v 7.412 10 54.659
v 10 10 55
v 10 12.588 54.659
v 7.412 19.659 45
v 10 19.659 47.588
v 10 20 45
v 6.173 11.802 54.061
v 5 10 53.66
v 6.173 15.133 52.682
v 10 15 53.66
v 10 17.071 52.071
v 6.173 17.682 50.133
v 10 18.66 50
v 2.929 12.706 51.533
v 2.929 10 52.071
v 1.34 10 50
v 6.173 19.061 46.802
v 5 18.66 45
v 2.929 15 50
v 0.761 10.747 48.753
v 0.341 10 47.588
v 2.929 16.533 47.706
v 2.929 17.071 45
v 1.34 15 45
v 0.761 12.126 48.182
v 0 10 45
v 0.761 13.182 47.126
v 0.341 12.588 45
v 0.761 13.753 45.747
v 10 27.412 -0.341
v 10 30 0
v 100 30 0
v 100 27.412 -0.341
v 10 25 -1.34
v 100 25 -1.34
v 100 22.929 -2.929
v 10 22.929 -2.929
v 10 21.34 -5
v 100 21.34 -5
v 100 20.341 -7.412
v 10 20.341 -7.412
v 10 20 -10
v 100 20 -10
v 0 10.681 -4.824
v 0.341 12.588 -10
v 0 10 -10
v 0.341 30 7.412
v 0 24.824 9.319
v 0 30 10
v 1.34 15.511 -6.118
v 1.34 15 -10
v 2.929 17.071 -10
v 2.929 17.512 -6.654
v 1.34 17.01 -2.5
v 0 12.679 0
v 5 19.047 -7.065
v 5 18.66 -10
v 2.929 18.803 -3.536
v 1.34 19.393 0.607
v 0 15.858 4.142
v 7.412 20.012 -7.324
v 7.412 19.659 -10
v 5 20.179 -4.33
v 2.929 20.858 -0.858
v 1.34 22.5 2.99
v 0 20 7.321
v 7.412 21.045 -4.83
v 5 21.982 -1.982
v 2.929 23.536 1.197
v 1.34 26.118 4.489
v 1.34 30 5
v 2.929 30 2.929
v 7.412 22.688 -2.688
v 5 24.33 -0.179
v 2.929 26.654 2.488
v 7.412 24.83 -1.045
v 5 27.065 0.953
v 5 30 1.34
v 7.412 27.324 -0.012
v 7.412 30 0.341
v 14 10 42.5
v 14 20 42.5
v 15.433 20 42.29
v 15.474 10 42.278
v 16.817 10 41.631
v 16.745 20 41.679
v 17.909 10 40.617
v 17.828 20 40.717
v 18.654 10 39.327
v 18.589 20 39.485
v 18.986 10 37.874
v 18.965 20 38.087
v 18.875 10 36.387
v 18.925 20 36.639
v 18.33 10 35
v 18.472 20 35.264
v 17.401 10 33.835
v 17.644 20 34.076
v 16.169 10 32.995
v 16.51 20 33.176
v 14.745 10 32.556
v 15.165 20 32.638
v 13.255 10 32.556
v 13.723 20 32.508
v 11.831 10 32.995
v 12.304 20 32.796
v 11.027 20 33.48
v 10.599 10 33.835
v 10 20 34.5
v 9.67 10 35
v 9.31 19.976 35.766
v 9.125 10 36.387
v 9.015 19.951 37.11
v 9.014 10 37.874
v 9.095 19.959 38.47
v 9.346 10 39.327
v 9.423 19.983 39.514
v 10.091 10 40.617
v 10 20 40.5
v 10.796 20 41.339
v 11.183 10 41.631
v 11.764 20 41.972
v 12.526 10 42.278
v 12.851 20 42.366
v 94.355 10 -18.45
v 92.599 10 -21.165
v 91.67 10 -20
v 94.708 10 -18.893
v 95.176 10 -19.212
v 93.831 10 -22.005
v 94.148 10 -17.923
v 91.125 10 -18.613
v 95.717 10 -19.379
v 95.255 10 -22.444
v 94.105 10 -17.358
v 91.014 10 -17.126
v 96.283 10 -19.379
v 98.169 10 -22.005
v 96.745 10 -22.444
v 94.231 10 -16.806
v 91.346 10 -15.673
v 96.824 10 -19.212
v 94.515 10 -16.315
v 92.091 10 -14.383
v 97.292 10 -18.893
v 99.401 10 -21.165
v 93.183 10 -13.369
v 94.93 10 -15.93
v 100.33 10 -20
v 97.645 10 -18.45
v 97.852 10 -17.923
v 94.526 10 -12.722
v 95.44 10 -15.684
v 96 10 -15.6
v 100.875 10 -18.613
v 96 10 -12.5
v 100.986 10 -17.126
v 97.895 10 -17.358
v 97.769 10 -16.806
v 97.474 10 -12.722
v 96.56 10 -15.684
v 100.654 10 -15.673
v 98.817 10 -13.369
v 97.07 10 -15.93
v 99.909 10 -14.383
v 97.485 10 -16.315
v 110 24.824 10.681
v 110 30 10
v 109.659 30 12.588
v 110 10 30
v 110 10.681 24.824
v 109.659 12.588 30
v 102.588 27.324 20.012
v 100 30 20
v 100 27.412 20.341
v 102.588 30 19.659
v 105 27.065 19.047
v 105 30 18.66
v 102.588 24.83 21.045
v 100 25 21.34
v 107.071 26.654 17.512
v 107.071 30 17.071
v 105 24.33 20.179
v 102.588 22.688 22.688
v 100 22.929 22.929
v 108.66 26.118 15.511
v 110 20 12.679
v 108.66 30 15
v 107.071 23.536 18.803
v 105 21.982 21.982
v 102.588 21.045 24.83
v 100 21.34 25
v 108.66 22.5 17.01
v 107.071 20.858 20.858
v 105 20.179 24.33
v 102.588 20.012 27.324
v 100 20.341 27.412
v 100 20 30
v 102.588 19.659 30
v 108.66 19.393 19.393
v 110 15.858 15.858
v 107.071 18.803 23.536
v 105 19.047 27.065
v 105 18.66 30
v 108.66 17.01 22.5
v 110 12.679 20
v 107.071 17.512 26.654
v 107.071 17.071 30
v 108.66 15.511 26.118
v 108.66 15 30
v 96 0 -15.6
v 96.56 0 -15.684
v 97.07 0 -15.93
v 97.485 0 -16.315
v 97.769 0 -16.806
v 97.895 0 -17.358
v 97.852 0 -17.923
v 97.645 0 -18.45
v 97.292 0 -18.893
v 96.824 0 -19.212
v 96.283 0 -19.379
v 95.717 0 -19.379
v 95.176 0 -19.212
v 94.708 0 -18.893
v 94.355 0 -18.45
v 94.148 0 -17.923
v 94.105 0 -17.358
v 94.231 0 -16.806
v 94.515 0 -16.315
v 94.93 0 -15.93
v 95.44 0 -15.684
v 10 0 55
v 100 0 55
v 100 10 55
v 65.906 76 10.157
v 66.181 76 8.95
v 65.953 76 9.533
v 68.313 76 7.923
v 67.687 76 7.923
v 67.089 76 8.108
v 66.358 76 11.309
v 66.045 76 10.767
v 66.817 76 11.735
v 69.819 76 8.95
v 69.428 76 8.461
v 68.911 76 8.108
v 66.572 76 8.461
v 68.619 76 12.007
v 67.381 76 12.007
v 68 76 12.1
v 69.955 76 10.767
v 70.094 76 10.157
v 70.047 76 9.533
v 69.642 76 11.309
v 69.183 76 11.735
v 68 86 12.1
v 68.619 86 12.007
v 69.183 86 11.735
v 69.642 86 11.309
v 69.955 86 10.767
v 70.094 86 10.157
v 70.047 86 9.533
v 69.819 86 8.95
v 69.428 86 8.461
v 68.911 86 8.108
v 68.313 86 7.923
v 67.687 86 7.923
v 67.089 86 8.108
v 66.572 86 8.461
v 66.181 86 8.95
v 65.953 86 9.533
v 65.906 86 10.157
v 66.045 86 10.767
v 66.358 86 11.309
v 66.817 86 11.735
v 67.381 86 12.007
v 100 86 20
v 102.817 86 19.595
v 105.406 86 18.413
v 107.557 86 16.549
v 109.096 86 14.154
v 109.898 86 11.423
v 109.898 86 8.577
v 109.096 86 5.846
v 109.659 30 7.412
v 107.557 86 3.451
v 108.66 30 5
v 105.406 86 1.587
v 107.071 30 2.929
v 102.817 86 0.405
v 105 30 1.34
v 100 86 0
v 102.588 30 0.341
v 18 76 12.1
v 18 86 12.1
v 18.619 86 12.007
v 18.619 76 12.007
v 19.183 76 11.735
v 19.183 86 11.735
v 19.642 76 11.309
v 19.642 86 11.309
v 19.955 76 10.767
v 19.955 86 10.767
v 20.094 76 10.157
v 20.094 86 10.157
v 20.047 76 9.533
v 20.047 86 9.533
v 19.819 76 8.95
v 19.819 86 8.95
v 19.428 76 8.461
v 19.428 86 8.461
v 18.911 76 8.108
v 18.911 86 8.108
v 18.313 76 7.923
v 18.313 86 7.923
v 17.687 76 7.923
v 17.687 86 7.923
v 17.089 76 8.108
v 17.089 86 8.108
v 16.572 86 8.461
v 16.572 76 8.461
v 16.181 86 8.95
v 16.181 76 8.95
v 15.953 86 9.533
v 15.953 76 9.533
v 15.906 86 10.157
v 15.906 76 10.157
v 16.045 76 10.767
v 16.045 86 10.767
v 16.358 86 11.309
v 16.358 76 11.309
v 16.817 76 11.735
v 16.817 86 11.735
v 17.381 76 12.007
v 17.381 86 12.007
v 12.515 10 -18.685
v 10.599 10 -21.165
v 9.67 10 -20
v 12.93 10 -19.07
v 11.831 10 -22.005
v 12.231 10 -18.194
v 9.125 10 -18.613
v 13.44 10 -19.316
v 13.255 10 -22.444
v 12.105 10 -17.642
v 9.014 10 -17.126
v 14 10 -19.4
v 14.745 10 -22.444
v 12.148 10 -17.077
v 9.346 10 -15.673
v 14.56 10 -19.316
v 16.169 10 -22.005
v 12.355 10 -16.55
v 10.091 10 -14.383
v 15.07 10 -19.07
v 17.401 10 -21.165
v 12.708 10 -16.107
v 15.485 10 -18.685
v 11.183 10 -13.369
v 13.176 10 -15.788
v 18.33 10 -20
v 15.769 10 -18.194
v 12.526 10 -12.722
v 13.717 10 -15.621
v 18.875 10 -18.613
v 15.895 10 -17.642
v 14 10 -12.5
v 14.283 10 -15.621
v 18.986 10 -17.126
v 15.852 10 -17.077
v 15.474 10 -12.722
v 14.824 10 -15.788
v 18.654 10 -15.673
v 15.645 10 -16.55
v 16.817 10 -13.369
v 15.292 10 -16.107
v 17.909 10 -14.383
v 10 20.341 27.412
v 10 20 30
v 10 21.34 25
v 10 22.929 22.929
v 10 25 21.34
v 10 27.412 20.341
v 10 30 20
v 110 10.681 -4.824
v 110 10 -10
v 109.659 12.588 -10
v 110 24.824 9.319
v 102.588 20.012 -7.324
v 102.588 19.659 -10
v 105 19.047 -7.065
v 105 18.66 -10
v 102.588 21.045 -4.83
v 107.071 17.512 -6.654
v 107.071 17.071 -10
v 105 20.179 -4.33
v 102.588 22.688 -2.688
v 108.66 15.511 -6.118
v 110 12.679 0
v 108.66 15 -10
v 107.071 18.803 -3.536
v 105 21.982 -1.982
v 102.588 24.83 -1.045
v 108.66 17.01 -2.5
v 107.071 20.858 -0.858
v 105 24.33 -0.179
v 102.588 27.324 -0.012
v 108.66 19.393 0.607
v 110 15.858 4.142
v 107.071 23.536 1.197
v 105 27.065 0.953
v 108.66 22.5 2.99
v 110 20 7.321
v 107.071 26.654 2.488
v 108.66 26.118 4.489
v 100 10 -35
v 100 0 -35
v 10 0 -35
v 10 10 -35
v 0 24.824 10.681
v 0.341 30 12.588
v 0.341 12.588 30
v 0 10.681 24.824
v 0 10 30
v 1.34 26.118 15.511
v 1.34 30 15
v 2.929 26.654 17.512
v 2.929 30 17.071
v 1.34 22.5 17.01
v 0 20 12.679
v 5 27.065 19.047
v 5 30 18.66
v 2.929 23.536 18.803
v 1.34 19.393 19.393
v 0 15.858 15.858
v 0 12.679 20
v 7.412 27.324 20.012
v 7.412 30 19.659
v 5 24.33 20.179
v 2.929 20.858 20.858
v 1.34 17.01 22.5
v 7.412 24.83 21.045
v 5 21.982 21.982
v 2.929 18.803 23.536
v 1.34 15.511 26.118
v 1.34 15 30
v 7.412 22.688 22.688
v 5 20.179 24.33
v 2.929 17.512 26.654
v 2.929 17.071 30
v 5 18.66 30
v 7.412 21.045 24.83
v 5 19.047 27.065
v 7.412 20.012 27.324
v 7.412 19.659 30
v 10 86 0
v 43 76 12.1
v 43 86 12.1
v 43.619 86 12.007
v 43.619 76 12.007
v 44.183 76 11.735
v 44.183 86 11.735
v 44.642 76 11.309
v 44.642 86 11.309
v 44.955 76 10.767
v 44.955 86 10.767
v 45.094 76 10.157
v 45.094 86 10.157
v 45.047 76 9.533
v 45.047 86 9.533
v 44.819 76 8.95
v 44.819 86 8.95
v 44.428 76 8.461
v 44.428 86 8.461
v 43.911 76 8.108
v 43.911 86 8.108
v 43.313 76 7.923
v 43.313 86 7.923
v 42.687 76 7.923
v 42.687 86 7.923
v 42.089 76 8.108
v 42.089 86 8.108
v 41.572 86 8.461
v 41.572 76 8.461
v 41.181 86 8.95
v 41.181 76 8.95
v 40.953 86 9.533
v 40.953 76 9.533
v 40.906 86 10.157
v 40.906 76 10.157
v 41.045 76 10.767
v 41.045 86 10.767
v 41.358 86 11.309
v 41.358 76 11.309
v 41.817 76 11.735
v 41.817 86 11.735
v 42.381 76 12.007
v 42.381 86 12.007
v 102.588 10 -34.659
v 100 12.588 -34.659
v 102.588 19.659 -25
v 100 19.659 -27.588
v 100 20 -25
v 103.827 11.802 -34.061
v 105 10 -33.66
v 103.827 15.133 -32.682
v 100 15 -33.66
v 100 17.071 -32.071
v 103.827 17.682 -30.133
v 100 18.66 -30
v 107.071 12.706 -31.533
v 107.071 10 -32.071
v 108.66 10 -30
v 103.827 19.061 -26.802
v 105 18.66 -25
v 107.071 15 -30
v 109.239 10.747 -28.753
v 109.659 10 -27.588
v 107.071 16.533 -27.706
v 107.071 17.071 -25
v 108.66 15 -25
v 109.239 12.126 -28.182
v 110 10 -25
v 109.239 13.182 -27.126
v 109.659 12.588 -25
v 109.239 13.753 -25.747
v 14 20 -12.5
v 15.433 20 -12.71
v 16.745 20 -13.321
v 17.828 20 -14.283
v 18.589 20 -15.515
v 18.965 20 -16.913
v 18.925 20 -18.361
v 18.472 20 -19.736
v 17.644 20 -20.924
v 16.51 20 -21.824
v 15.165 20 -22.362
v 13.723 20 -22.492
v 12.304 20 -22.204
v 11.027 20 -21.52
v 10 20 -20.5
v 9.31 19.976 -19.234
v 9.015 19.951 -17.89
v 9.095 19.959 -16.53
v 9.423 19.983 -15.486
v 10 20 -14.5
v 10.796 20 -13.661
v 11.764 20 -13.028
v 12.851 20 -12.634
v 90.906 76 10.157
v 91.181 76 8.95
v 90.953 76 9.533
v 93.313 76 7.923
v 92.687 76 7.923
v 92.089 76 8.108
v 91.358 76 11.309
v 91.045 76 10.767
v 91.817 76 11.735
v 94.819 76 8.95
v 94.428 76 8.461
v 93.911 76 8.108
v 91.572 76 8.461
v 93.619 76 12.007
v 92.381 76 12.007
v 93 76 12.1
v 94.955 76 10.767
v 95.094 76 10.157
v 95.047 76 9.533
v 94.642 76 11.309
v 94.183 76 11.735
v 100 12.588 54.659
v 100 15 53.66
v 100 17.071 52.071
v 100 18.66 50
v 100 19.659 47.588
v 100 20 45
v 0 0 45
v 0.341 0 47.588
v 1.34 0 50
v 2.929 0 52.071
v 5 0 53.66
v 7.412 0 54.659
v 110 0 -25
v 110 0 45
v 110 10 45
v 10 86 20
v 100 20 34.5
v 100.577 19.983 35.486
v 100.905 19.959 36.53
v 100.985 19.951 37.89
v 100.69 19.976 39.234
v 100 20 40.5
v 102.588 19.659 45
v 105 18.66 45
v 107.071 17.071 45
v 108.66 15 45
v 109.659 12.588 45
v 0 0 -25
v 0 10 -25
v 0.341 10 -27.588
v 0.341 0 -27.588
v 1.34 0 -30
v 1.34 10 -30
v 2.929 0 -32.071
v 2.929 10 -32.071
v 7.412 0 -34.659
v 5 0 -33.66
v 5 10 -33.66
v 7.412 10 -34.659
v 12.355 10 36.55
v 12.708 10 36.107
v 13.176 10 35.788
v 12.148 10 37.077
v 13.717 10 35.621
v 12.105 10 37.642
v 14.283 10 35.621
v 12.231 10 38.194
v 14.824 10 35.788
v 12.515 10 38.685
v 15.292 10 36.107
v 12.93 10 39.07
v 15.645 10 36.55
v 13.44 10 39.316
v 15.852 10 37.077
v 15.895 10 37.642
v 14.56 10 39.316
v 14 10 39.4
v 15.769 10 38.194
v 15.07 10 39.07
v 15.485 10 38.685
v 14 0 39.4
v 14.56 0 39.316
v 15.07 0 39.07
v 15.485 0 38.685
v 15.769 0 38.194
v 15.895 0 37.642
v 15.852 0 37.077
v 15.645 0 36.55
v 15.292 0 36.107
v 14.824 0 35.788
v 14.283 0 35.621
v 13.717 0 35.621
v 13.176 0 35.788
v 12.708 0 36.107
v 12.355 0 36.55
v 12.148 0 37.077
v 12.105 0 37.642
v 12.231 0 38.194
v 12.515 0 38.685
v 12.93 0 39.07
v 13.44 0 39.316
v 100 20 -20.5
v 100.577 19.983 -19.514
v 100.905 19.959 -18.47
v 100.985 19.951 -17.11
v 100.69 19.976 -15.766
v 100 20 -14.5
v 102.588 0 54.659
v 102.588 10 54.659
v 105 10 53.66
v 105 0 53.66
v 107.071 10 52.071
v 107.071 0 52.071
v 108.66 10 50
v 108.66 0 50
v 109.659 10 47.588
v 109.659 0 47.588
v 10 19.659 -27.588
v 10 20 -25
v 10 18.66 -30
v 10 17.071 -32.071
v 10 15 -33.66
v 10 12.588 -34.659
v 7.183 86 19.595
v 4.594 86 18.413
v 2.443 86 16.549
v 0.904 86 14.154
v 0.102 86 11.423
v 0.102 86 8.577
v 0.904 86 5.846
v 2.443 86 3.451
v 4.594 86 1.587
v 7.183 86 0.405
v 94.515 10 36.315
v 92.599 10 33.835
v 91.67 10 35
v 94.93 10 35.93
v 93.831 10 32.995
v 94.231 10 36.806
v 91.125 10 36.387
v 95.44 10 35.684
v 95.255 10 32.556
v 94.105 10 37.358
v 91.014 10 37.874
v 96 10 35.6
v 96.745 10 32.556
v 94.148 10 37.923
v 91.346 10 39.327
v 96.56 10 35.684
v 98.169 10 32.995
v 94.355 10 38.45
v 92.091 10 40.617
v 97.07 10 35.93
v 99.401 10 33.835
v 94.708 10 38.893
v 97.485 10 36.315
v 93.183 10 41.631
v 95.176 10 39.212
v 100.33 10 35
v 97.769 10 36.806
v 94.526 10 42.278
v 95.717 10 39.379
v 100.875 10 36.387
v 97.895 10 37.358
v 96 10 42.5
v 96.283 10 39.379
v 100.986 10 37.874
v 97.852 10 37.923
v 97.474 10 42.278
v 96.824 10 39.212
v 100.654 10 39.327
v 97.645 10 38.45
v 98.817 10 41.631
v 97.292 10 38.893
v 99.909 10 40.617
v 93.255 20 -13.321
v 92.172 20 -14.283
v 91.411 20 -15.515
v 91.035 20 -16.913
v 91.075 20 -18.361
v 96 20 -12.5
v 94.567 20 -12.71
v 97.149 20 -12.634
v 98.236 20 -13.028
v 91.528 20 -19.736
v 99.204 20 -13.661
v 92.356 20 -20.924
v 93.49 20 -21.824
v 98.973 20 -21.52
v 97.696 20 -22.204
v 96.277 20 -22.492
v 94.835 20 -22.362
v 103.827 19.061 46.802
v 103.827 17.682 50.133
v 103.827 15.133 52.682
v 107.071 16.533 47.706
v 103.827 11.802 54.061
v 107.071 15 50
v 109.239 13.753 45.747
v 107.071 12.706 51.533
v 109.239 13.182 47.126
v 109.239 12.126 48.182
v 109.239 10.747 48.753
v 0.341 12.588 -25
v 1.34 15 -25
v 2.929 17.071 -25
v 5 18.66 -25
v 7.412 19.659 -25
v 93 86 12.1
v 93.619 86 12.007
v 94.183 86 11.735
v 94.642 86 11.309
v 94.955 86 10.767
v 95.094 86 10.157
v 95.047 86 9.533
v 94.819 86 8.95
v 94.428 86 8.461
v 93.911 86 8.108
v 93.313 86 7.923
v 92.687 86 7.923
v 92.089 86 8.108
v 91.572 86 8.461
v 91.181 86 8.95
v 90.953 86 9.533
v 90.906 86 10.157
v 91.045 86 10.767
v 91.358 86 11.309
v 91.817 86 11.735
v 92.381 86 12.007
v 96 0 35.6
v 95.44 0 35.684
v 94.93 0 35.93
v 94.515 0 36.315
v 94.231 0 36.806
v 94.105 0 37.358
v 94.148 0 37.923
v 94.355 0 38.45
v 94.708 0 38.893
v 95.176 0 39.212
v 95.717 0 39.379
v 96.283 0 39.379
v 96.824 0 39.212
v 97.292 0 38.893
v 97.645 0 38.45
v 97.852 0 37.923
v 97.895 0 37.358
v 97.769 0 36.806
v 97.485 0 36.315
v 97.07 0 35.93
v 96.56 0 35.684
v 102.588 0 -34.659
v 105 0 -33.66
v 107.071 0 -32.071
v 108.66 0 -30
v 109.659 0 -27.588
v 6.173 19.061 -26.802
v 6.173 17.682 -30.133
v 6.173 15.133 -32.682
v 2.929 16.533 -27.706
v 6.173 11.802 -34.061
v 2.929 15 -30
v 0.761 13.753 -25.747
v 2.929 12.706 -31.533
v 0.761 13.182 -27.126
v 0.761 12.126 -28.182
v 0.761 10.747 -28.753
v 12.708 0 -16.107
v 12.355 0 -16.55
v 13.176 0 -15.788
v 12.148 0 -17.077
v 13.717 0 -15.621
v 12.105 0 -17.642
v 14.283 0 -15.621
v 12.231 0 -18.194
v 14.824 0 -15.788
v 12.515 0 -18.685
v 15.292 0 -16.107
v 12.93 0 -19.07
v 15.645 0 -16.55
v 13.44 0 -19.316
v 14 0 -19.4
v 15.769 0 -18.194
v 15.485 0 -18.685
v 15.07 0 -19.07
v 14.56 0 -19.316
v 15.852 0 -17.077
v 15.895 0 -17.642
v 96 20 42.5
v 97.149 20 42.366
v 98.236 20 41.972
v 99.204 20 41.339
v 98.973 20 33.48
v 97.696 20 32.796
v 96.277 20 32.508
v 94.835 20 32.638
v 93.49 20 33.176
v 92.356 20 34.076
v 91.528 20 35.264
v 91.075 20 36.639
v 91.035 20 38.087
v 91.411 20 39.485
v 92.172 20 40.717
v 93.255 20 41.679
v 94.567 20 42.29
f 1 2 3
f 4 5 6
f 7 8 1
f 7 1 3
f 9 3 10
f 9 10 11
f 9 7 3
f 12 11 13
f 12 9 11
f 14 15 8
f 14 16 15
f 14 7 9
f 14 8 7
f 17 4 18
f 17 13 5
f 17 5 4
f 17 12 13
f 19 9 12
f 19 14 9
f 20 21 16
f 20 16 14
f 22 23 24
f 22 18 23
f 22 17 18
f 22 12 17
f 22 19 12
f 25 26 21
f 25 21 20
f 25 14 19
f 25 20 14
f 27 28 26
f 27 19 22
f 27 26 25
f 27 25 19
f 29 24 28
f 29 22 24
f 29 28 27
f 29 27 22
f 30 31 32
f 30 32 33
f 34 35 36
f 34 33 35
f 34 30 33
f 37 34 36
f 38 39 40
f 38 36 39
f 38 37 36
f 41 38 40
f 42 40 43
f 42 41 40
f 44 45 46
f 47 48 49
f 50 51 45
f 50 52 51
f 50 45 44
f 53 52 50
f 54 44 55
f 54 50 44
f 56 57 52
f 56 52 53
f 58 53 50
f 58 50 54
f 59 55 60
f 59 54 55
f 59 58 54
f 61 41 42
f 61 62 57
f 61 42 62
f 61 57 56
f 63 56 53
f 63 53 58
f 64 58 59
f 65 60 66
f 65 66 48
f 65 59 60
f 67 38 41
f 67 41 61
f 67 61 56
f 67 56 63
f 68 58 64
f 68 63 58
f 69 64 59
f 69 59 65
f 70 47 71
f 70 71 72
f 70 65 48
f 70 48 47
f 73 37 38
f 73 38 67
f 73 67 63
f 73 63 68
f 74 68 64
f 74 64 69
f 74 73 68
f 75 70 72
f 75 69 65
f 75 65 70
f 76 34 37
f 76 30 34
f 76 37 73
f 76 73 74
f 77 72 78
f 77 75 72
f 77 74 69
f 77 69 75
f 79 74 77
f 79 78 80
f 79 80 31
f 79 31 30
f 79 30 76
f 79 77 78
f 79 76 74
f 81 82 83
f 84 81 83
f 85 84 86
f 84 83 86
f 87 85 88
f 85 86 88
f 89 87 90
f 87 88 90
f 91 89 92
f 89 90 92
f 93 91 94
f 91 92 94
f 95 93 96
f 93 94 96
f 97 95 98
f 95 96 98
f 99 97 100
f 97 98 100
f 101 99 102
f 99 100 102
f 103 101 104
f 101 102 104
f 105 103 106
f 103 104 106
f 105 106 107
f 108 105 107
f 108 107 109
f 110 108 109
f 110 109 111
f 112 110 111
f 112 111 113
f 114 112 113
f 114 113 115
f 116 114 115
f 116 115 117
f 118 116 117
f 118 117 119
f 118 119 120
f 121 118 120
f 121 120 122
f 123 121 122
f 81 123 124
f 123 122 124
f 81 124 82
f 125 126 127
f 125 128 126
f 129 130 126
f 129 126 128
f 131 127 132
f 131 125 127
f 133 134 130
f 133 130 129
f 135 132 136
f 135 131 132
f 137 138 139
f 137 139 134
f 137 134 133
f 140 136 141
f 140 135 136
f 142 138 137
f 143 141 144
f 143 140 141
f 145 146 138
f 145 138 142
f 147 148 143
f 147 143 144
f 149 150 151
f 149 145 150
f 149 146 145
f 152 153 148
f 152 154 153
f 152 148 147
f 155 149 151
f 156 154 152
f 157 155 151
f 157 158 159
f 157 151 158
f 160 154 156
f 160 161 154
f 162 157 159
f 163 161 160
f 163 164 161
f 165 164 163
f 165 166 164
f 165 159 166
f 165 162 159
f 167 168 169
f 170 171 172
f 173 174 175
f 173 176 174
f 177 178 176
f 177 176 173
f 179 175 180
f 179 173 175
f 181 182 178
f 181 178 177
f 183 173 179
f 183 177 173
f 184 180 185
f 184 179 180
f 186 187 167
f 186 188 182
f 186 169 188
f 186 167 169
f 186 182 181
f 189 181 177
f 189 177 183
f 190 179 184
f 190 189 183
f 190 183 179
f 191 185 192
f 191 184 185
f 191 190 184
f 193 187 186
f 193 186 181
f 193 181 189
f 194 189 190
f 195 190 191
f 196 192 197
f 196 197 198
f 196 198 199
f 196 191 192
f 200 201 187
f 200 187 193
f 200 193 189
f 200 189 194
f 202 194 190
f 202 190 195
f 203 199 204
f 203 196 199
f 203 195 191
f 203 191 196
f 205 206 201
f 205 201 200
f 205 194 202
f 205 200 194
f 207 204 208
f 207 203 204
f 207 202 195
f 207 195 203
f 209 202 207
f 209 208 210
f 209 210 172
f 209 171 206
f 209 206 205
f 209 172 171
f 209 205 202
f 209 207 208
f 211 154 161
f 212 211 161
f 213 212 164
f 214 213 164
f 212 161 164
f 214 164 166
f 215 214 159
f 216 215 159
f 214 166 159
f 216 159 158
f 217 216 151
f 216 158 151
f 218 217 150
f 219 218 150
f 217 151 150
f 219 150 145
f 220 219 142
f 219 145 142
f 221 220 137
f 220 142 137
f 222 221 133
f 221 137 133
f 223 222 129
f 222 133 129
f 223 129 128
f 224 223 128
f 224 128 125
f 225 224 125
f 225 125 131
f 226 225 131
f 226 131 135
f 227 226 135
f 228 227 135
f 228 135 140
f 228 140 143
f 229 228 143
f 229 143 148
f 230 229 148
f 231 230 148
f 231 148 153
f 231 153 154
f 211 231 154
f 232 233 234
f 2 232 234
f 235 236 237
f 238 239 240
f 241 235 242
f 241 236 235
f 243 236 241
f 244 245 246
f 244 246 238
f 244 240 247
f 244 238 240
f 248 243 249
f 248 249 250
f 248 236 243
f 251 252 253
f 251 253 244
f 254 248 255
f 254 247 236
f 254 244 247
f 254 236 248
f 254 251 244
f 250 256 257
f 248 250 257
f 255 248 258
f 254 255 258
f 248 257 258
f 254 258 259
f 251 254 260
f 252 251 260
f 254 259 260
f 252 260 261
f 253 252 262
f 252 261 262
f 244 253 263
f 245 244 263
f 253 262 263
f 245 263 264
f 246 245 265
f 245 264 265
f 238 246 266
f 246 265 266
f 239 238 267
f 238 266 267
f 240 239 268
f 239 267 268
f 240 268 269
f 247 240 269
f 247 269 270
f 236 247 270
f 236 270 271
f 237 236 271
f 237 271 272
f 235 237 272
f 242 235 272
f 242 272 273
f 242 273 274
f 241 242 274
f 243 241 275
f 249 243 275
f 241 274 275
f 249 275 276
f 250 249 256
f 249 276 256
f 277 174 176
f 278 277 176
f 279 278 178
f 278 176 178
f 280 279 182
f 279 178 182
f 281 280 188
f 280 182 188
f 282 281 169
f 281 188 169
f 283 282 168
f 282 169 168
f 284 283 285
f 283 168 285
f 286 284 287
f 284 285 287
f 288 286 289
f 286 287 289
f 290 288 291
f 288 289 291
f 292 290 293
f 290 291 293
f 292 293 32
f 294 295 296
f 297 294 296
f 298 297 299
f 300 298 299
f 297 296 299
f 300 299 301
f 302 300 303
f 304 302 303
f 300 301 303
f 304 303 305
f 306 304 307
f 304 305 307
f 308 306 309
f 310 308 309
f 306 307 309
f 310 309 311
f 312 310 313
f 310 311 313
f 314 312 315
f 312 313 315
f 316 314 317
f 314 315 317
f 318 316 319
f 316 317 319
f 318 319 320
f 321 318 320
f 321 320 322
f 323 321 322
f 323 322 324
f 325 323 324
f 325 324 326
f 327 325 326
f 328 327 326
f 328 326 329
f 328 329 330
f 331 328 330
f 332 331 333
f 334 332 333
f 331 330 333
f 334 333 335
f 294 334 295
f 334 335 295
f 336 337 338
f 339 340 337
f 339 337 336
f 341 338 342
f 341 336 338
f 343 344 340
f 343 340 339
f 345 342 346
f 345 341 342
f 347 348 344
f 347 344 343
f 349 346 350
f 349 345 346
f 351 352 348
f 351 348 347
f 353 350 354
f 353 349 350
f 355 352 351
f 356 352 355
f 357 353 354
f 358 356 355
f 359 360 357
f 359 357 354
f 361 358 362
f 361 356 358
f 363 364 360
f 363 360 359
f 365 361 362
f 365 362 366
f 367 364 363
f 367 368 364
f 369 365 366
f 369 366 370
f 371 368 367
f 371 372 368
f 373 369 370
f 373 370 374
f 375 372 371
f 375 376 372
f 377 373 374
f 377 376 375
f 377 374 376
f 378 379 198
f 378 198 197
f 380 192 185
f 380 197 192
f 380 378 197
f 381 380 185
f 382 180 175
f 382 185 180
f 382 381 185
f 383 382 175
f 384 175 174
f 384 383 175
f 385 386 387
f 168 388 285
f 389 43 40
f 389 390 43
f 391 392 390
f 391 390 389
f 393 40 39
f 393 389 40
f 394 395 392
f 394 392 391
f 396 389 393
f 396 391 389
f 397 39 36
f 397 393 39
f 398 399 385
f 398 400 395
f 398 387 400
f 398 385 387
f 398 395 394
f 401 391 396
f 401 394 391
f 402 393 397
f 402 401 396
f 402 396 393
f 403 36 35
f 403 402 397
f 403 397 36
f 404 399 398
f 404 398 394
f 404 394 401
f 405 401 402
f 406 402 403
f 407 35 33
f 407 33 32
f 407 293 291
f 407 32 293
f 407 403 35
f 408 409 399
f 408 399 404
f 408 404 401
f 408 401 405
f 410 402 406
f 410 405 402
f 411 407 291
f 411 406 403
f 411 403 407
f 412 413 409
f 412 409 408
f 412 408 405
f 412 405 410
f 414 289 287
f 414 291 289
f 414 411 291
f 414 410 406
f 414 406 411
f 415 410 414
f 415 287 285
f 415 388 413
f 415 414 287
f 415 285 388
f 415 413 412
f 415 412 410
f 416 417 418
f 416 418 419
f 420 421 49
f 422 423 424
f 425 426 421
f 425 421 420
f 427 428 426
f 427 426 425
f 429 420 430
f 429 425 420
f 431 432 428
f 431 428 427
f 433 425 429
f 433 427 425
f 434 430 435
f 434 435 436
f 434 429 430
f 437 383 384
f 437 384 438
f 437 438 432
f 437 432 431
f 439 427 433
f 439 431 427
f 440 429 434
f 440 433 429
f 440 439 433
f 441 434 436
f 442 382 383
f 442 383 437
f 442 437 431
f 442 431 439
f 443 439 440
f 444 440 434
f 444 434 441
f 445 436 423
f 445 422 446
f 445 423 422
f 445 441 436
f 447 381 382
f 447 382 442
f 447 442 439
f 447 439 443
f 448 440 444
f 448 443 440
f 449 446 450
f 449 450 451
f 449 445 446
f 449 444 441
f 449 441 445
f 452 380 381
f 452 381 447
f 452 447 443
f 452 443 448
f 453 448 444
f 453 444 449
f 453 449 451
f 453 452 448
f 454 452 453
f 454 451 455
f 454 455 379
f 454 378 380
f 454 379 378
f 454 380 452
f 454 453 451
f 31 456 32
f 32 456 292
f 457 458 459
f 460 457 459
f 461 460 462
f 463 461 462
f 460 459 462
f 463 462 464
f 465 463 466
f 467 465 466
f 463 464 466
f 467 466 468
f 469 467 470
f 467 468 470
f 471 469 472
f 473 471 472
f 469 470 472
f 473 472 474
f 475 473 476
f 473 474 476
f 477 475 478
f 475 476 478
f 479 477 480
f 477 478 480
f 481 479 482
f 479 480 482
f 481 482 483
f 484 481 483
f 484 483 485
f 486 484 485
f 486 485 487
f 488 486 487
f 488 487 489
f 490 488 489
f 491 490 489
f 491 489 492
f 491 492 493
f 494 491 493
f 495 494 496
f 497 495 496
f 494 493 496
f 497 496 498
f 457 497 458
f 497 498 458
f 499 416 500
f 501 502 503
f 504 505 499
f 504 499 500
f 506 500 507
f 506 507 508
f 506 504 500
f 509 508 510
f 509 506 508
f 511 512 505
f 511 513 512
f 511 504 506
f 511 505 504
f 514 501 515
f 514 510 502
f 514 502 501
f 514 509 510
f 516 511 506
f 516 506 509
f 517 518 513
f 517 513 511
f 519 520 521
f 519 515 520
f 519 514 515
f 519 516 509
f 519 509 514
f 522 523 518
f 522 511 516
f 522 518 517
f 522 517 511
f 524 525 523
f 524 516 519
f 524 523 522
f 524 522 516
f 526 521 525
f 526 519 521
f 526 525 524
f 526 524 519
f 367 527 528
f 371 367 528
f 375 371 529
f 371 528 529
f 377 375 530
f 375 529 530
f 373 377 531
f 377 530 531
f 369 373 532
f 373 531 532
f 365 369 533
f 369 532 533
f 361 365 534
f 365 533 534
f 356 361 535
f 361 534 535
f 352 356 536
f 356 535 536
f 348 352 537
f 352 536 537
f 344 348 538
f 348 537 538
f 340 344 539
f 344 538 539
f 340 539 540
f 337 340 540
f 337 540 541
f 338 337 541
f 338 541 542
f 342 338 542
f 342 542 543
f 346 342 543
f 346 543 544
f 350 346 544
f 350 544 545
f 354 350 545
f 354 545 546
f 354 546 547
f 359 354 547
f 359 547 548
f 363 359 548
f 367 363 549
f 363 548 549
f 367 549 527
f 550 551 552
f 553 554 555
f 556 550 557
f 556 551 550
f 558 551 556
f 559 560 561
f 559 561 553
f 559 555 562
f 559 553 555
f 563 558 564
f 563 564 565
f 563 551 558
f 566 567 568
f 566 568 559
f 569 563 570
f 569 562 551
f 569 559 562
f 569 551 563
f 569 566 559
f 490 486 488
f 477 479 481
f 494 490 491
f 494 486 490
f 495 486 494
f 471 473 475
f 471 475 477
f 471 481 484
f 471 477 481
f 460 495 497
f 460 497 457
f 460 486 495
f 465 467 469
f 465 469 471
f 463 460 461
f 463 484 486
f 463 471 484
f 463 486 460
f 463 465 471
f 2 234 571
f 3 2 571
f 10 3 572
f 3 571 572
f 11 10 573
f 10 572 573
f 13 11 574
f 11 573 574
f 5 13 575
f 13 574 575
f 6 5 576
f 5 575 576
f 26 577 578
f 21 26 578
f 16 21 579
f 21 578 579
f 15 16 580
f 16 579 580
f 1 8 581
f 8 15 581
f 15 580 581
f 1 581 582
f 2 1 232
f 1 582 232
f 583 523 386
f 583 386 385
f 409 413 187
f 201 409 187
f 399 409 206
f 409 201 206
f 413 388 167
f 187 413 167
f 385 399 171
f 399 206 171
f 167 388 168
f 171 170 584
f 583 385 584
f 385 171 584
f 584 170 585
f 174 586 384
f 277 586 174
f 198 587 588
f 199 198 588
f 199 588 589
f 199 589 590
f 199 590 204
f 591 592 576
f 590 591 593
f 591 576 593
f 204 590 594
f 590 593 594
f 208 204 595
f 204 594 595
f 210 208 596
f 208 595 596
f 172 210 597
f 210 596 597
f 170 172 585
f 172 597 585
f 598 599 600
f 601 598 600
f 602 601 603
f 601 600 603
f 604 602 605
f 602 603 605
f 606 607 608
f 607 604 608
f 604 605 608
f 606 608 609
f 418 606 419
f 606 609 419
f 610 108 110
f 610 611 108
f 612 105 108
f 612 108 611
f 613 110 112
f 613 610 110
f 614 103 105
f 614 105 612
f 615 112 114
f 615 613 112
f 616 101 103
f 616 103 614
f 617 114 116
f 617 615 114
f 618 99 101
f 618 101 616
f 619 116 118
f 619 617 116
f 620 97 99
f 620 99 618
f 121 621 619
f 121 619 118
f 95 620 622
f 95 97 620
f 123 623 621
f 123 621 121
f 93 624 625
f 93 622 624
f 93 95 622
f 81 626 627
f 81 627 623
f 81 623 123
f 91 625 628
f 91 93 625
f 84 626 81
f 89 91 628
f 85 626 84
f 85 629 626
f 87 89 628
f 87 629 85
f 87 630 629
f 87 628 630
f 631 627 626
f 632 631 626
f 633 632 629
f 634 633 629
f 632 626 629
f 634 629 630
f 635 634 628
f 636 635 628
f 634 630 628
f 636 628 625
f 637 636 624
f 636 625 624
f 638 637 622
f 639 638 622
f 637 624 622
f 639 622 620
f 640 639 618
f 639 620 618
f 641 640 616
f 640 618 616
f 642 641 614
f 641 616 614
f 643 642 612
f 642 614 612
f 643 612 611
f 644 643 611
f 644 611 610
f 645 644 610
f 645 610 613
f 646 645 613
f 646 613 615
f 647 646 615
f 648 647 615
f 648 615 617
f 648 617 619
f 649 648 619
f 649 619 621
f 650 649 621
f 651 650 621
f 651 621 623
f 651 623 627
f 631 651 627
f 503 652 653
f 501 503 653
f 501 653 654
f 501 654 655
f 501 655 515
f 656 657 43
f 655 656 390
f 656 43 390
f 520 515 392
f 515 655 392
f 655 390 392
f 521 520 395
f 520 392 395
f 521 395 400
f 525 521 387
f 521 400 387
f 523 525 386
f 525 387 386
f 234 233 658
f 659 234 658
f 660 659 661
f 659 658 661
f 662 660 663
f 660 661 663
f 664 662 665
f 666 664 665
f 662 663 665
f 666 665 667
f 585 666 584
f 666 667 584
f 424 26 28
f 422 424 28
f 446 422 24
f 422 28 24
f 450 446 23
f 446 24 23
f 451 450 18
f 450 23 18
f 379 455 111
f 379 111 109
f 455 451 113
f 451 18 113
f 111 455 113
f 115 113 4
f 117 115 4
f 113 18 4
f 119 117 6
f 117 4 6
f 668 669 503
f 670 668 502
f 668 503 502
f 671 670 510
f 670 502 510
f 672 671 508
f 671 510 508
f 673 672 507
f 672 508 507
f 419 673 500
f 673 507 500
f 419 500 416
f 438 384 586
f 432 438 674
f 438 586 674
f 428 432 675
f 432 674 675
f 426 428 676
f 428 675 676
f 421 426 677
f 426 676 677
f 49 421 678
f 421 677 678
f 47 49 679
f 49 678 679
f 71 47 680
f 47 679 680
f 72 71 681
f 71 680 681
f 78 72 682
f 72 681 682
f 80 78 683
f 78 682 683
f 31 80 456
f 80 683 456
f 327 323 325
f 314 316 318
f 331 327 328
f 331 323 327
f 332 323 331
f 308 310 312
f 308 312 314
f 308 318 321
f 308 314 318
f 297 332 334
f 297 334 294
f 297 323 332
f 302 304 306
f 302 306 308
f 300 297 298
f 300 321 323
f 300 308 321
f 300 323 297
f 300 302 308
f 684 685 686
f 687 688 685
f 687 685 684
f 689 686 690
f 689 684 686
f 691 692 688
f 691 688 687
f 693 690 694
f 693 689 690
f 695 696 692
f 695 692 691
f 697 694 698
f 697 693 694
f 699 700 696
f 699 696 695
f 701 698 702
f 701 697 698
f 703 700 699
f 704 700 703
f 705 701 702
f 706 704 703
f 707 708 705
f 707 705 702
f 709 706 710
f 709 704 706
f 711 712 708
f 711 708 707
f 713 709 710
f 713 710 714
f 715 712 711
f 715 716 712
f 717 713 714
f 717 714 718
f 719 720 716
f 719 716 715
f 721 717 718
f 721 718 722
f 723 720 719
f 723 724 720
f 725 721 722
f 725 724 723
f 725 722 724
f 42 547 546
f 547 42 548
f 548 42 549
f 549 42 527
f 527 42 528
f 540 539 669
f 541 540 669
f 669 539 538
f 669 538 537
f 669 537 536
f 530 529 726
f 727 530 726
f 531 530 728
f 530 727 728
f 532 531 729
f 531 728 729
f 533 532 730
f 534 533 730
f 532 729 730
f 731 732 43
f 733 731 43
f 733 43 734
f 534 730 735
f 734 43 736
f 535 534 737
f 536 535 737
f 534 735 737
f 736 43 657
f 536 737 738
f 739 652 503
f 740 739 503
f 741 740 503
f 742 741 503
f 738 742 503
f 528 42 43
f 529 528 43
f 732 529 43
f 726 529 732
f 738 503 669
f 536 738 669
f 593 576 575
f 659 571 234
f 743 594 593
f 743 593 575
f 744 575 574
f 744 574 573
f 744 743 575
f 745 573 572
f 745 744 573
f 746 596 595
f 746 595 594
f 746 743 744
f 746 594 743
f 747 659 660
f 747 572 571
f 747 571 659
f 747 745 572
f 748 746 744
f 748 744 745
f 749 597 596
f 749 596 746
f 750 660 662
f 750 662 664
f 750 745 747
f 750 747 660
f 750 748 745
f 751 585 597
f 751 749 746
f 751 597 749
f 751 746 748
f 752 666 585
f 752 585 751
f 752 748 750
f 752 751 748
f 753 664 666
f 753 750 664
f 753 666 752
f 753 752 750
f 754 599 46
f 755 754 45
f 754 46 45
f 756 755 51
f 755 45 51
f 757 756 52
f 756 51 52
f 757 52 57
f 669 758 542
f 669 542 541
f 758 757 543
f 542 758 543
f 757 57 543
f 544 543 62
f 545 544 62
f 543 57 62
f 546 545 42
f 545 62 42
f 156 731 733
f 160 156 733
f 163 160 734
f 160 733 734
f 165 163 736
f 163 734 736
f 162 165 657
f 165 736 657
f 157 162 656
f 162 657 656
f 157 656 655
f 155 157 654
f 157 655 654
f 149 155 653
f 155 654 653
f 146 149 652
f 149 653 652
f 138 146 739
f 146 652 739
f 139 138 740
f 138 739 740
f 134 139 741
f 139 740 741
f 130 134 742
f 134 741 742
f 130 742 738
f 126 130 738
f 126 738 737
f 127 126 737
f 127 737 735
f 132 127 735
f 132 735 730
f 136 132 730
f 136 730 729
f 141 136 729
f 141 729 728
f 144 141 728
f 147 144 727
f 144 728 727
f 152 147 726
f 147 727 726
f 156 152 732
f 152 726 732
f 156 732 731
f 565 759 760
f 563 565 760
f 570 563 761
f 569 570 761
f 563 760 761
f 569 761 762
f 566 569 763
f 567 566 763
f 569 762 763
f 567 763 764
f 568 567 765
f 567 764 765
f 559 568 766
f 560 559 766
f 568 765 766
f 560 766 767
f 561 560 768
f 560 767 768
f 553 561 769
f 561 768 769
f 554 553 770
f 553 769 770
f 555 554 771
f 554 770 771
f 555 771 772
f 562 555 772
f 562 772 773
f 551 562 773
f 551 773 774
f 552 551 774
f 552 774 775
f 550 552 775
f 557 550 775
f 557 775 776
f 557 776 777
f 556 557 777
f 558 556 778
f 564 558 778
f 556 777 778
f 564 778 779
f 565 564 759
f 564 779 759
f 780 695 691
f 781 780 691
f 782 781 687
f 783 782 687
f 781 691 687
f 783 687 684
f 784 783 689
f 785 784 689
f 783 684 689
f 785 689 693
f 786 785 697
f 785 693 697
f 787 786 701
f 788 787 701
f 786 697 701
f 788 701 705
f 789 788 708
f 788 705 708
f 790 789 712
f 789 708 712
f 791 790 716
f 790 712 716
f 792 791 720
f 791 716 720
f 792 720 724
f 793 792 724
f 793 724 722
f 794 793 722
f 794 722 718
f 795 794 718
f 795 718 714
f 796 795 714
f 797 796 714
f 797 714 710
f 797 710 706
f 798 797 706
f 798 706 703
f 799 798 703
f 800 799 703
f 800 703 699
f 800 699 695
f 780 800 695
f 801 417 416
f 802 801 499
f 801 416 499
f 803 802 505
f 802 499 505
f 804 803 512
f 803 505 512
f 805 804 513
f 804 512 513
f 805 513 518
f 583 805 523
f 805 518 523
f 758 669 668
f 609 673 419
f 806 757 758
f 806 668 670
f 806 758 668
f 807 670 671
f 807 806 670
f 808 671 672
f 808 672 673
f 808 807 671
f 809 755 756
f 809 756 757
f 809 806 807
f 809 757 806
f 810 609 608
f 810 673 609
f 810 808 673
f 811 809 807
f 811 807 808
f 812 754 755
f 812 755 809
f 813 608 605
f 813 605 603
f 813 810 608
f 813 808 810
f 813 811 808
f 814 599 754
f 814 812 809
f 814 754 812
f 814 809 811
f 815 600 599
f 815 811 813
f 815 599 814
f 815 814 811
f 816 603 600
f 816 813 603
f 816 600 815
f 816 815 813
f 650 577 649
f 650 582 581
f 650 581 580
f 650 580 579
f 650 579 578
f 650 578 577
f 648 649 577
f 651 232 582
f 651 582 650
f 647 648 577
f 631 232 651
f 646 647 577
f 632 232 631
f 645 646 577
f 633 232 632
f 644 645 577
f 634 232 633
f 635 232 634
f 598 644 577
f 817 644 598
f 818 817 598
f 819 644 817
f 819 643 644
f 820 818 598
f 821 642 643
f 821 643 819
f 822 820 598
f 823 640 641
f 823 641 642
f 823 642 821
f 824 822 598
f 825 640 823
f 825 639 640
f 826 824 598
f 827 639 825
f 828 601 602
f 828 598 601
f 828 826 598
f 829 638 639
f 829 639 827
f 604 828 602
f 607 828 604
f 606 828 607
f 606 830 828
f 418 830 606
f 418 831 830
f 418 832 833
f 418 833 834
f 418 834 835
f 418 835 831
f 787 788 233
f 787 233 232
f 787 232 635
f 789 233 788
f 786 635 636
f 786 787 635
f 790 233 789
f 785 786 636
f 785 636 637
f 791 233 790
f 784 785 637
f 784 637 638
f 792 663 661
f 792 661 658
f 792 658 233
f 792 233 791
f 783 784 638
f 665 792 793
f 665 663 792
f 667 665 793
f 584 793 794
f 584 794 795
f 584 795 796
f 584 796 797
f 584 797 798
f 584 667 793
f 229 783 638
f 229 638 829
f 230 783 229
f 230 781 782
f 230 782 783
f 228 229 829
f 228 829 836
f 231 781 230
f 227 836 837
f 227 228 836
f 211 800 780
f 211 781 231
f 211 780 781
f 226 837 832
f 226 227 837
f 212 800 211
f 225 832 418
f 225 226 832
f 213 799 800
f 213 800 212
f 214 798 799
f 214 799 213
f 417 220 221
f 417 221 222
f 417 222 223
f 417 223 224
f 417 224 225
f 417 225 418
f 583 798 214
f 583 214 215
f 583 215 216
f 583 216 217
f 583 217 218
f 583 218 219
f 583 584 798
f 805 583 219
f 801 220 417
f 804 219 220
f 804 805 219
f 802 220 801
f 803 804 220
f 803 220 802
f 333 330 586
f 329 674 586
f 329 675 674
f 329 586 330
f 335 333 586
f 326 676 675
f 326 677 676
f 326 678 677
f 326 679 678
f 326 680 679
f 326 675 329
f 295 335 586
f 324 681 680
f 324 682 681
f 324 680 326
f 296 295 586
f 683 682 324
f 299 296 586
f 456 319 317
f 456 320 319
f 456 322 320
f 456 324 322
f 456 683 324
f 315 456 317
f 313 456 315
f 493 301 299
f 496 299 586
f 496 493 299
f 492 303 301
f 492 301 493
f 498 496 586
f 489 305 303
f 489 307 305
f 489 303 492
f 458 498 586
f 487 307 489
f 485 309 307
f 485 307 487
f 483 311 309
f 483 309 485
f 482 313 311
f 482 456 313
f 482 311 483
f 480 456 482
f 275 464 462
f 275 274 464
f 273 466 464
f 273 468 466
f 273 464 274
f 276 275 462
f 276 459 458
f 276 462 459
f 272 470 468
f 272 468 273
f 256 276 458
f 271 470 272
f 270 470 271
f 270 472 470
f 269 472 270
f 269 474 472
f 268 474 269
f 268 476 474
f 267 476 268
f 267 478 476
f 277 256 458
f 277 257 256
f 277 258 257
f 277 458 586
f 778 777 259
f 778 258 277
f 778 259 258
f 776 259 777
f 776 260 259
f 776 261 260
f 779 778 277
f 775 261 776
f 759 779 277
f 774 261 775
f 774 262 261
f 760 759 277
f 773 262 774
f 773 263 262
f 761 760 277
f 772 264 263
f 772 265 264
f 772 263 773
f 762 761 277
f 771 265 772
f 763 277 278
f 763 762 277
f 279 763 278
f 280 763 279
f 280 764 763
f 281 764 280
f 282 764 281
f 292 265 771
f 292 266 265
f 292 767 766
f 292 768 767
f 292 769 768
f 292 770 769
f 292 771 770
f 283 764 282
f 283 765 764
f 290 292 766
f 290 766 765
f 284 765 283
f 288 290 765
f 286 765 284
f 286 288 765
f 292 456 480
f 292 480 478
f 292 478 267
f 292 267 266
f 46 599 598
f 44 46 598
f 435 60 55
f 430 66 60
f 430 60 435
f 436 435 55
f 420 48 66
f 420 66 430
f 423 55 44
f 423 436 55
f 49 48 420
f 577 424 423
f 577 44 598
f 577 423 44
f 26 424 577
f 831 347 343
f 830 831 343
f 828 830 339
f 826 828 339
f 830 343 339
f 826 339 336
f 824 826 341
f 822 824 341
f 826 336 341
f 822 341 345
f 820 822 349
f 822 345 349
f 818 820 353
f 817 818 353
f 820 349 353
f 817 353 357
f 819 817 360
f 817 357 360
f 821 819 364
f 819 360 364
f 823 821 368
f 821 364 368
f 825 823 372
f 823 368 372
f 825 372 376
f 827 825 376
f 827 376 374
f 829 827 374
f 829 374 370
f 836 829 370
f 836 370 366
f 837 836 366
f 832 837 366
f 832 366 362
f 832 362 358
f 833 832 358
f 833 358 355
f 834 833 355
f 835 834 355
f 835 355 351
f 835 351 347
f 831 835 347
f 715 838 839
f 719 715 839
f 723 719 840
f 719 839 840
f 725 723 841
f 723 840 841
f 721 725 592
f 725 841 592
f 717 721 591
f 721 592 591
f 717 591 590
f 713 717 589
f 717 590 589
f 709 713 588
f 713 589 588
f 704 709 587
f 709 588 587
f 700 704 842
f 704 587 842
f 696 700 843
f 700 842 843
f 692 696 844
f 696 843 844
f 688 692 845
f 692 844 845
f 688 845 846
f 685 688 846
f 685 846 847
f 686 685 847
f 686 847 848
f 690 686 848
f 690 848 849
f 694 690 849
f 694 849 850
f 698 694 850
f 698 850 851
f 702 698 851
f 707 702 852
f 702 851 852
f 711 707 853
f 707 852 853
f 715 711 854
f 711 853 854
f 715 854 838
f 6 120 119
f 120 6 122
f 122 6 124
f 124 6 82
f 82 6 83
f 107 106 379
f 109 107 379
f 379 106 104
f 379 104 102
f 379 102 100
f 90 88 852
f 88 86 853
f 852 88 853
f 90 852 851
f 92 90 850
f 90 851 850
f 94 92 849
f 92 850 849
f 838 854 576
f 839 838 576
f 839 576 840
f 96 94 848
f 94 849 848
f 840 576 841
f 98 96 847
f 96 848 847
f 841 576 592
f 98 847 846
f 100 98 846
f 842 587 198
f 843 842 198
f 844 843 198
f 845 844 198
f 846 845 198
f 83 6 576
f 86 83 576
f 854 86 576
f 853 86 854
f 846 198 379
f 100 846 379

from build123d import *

# Parameters (mm, degrees)
SKETCH2_W           = 110
SKETCH2_H           = 86
BOSS_EXTRUDE1_DEPTH = 20
SKETCH3_W           = 90
SKETCH3_H           = 20
BOSS_EXTRUDE2_DEPTH = 110
SKETCH4_R           = 1.9
CUT_EXTRUDE1_DEPTH  = 20
SKETCH5_R           = 5
CUT_EXTRUDE2_DEPTH  = 10
FILLET1_R           = 10
SKETCH6_R           = 2.1
CUT_EXTRUDE3_DEPTH  = 10


with BuildPart() as part:
    # Sketch2 → Boss-Extrude1 (new body)
    with BuildSketch(Plane.XY):
        with Locations((55, 43)):
            Rectangle(SKETCH2_W, SKETCH2_H)
    extrude(amount=BOSS_EXTRUDE1_DEPTH)

    # Sketch3 → Boss-Extrude2 (add)
    with BuildSketch(Plane(origin=(110, 0, 0), x_dir=(0, 0, -1), z_dir=(1, 0, 0))):
        with Locations((-10, 10)):
            Rectangle(SKETCH3_W, SKETCH3_H)
    extrude(amount=-BOSS_EXTRUDE2_DEPTH)

    # Sketch4 → Cut-Extrude1 (cut)
    with BuildSketch(Plane(origin=(0, 20, 0), x_dir=(1, 0, 0), z_dir=(0, 1, 0))):
        with Locations(Location((14, -37.5, 0), (0, 0, 270))):
            Circle(SKETCH4_R)
        with Locations(Location((96, -37.5, 0), (0, 0, 90))):
            Circle(SKETCH4_R)
        with Locations(Location((96, 17.5, 0), (0, 0, 270))):
            Circle(SKETCH4_R)
        with Locations(Location((14, 17.5, 0), (0, 0, 90))):
            Circle(SKETCH4_R)
    extrude(amount=-CUT_EXTRUDE1_DEPTH, mode=Mode.SUBTRACT)

    # Sketch5 → Cut-Extrude2 (cut)
    with BuildSketch(Plane(origin=(0, 20, 0), x_dir=(1, 0, 0), z_dir=(0, 1, 0))):
        with Locations(Location((96, -37.5, 0), (0, 0, 270))):
            Circle(SKETCH5_R)
        with Locations(Location((14, -37.5, 0), (0, 0, 270))):
            Circle(SKETCH5_R)
        with Locations(Location((14, 17.5, 0), (0, 0, 270))):
            Circle(SKETCH5_R)
        with Locations(Location((96, 17.5, 0), (0, 0, 270))):
            Circle(SKETCH5_R)
    extrude(amount=-CUT_EXTRUDE2_DEPTH, mode=Mode.SUBTRACT)

    # Fillet1
    # the kernel refuses this fillet: 10 mm, written as the material it adds along each edge
    with BuildSketch(Plane(origin=(0, 20, 0), x_dir=(0, 0, -1), z_dir=(1, 0, 0)), Plane(origin=(0, 20, 20), x_dir=(0, 1, 0), z_dir=(1, 0, 0))) as fillet1_piece_1:
        with BuildLine():
            CenterArc((FILLET1_R, FILLET1_R), FILLET1_R, 180, 90)
            Line((0, FILLET1_R), (0, 0))
            Line((0, 0), (FILLET1_R, 0))
        make_face()
    extrude(amount=110)
    # the kernel refuses this fillet: 10 mm, written as the material it takes off along each edge
    with BuildSketch(Plane(origin=(0, 45, -35), x_dir=(0, 0, 1), z_dir=(0, -1, 0)), Plane(origin=(110, 45, -35), x_dir=(-1, 0, 0), z_dir=(0, -1, 0)), Plane(origin=(0, -25, 55), x_dir=(0, 0, -1), z_dir=(0, 1, 0)), Plane(origin=(110, -25, 55), x_dir=(-1, 0, 0), z_dir=(0, 1, 0))) as fillet1_2_piece_1:
        with BuildLine():
            CenterArc((FILLET1_R, -FILLET1_R), FILLET1_R, 90, 90)
            Line((0, -FILLET1_R), (0, 0))
            Line((0, 0), (FILLET1_R, 0))
        make_face()
    extrude(amount=70, mode=Mode.SUBTRACT)
    with BuildSketch(Plane(origin=(135, 20, -35), x_dir=(0, -1, 0), z_dir=(-1, 0, 0))) as fillet1_2_piece_2:
        with BuildLine():
            CenterArc((FILLET1_R, FILLET1_R), FILLET1_R, 180, 90)
            Line((0, FILLET1_R), (0, 0))
            Line((0, 0), (FILLET1_R, 0))
        make_face()
    extrude(amount=160, mode=Mode.SUBTRACT)
    with BuildSketch(Plane(origin=(135, 20, 55), x_dir=(0, -1, 0), z_dir=(-1, 0, 0))) as fillet1_2_piece_3:
        with BuildLine():
            CenterArc((FILLET1_R, -FILLET1_R), FILLET1_R, 90, 90)
            Line((0, -FILLET1_R), (0, 0))
            Line((0, 0), (FILLET1_R, 0))
        make_face()
    extrude(amount=160, mode=Mode.SUBTRACT)
    # the kernel refuses this fillet: 10 mm, written as the material it takes off along each edge
    with BuildSketch(Plane(origin=(100, 10, 45), x_dir=(0, 1, 0), z_dir=(1, 0, 0))) as fillet1_3_piece_1_section:
        Polygon((0, 0), (FILLET1_R, 0), (FILLET1_R, FILLET1_R), (0, FILLET1_R), align=None)
    fillet1_3_piece_1 = extrude(amount=FILLET1_R, mode=Mode.PRIVATE)
    fillet1_3_piece_1 = fillet1_3_piece_1 - Plane(origin=(100, 10, 45), x_dir=(0, -0.7071067811865475, -0.7071067811865475), z_dir=(1, 0, 0)) * Sphere(FILLET1_R, mode=Mode.PRIVATE)
    add(fillet1_3_piece_1, mode=Mode.SUBTRACT)
    with BuildSketch(Plane(origin=(10, 10, 45), x_dir=(0, 1, 0), z_dir=(-1, 0, 0))) as fillet1_3_piece_2_section:
        Polygon((0, 0), (FILLET1_R, 0), (FILLET1_R, -FILLET1_R), (0, -FILLET1_R), align=None)
    fillet1_3_piece_2 = extrude(amount=FILLET1_R, mode=Mode.PRIVATE)
    fillet1_3_piece_2 = fillet1_3_piece_2 - Plane(origin=(10, 10, 45), x_dir=(0, -0.7071067811865475, -0.7071067811865475), z_dir=(-1, 0, 0)) * Sphere(FILLET1_R, mode=Mode.PRIVATE)
    add(fillet1_3_piece_2, mode=Mode.SUBTRACT)
    with BuildSketch(Plane(origin=(10, 10, -25), x_dir=(0, 1, 0), z_dir=(-1, 0, 0))) as fillet1_3_piece_3_section:
        Polygon((0, 0), (FILLET1_R, 0), (FILLET1_R, FILLET1_R), (0, FILLET1_R), align=None)
    fillet1_3_piece_3 = extrude(amount=FILLET1_R, mode=Mode.PRIVATE)
    fillet1_3_piece_3 = fillet1_3_piece_3 - Plane(origin=(10, 10, -25), x_dir=(0, -0.7071067811865475, 0.7071067811865475), z_dir=(-1, 0, 0)) * Sphere(FILLET1_R, mode=Mode.PRIVATE)
    add(fillet1_3_piece_3, mode=Mode.SUBTRACT)
    with BuildSketch(Plane(origin=(100, 10, -25), x_dir=(0, 1, 0), z_dir=(1, 0, 0))) as fillet1_3_piece_4_section:
        Polygon((0, 0), (FILLET1_R, 0), (FILLET1_R, -FILLET1_R), (0, -FILLET1_R), align=None)
    fillet1_3_piece_4 = extrude(amount=FILLET1_R, mode=Mode.PRIVATE)
    fillet1_3_piece_4 = fillet1_3_piece_4 - Plane(origin=(100, 10, -25), x_dir=(0, -0.7071067811865475, 0.7071067811865475), z_dir=(1, 0, 0)) * Sphere(FILLET1_R, mode=Mode.PRIVATE)
    add(fillet1_3_piece_4, mode=Mode.SUBTRACT)
    with BuildSketch(Plane(origin=(0, 111, 0), x_dir=(0, 0, 1), z_dir=(0, -1, 0)), Plane(origin=(110, 30, 0), x_dir=(0, 0, 1), z_dir=(0, 1, 0))) as fillet1_3_piece_5:
        with BuildLine():
            CenterArc((FILLET1_R, -FILLET1_R), FILLET1_R, 90, 90)
            Line((0, -FILLET1_R), (0, 0))
            Line((0, 0), (FILLET1_R, 0))
        make_face()
    extrude(amount=81, mode=Mode.SUBTRACT)
    with BuildSketch(Plane(origin=(0, 111, 20), x_dir=(0, 0, -1), z_dir=(0, -1, 0)), Plane(origin=(110, 30, 20), x_dir=(0, 0, -1), z_dir=(0, 1, 0))) as fillet1_3_piece_6:
        with BuildLine():
            CenterArc((FILLET1_R, FILLET1_R), FILLET1_R, 180, 90)
            Line((0, FILLET1_R), (0, 0))
            Line((0, 0), (FILLET1_R, 0))
        make_face()
    extrude(amount=81, mode=Mode.SUBTRACT)
    with BuildSketch(Plane(origin=(110, 20, -10), x_dir=(0, -1, 0), z_dir=(0, 0, -1)), Plane(origin=(110, 20, 45), x_dir=(0, -1, 0), z_dir=(0, 0, -1))) as fillet1_3_piece_7:
        with BuildLine():
            CenterArc((FILLET1_R, FILLET1_R), FILLET1_R, 180, 90)
            Line((0, FILLET1_R), (0, 0))
            Line((0, 0), (FILLET1_R, 0))
        make_face()
    extrude(amount=15, mode=Mode.SUBTRACT)
    with BuildSketch(Plane(origin=(0, 20, -10), x_dir=(0, -1, 0), z_dir=(0, 0, -1)), Plane(origin=(0, 20, 45), x_dir=(0, -1, 0), z_dir=(0, 0, -1))) as fillet1_3_piece_8:
        with BuildLine():
            CenterArc((FILLET1_R, -FILLET1_R), FILLET1_R, 90, 90)
            Line((0, -FILLET1_R), (0, 0))
            Line((0, 0), (FILLET1_R, 0))
        make_face()
    extrude(amount=15, mode=Mode.SUBTRACT)
    with BuildSketch(Plane(origin=(110, 30, 30), x_dir=(0, 0, -1), z_dir=(0, 1, 0))) as fillet1_3_piece_9:
        with BuildLine():
            CenterArc((10 + FILLET1_R, FILLET1_R), FILLET1_R, 180, 90)
            Line((10, FILLET1_R), (10, 0))
            Line((10, 0), (10 + FILLET1_R, 0))
        make_face()
    revolve(axis=Axis((110, 30, 30), (-1, 0, 0)), revolution_arc=90, mode=Mode.SUBTRACT)
    with BuildSketch(Plane(origin=(0, 30, 30), x_dir=(0, 0, -1), z_dir=(0, 1, 0))) as fillet1_3_piece_10:
        with BuildLine():
            CenterArc((10 + FILLET1_R, -FILLET1_R), FILLET1_R, 90, 90)
            Line((10, -FILLET1_R), (10, 0))
            Line((10, 0), (10 + FILLET1_R, 0))
        make_face()
    revolve(axis=Axis((0, 30, 30), (-1, 0, 0)), revolution_arc=90, mode=Mode.SUBTRACT)
    with BuildSketch(Plane(origin=(0, 30, -10), x_dir=(0, -1, 0), z_dir=(0, 0, -1))) as fillet1_3_piece_11:
        with BuildLine():
            CenterArc((10 + FILLET1_R, -FILLET1_R), FILLET1_R, 90, 90)
            Line((10, -FILLET1_R), (10, 0))
            Line((10, 0), (10 + FILLET1_R, 0))
        make_face()
    revolve(axis=Axis((0, 30, -10), (-1, 0, 0)), revolution_arc=90, mode=Mode.SUBTRACT)
    with BuildSketch(Plane(origin=(110, 30, -10), x_dir=(0, -1, 0), z_dir=(0, 0, -1))) as fillet1_3_piece_12:
        with BuildLine():
            CenterArc((10 + FILLET1_R, FILLET1_R), FILLET1_R, 180, 90)
            Line((10, FILLET1_R), (10, 0))
            Line((10, 0), (10 + FILLET1_R, 0))
        make_face()
    revolve(axis=Axis((110, 30, -10), (-1, 0, 0)), revolution_arc=90, mode=Mode.SUBTRACT)

    # Sketch6 → Cut-Extrude3 (cut)
    with BuildSketch(Plane(origin=(0, 86, 0), x_dir=(1, 0, 0), z_dir=(0, 1, 0))):
        with Locations(Location((18, -10, 0), (0, 0, 270))):
            Circle(SKETCH6_R)
        with Locations(Location((43, -10, 0), (0, 0, 270))):
            Circle(SKETCH6_R)
        with Locations(Location((68, -10, 0), (0, 0, 270))):
            Circle(SKETCH6_R)
        with Locations(Location((93, -10, 0), (0, 0, 270))):
            Circle(SKETCH6_R)
    extrude(amount=-CUT_EXTRUDE3_DEPTH, mode=Mode.SUBTRACT)


solid = part.part
